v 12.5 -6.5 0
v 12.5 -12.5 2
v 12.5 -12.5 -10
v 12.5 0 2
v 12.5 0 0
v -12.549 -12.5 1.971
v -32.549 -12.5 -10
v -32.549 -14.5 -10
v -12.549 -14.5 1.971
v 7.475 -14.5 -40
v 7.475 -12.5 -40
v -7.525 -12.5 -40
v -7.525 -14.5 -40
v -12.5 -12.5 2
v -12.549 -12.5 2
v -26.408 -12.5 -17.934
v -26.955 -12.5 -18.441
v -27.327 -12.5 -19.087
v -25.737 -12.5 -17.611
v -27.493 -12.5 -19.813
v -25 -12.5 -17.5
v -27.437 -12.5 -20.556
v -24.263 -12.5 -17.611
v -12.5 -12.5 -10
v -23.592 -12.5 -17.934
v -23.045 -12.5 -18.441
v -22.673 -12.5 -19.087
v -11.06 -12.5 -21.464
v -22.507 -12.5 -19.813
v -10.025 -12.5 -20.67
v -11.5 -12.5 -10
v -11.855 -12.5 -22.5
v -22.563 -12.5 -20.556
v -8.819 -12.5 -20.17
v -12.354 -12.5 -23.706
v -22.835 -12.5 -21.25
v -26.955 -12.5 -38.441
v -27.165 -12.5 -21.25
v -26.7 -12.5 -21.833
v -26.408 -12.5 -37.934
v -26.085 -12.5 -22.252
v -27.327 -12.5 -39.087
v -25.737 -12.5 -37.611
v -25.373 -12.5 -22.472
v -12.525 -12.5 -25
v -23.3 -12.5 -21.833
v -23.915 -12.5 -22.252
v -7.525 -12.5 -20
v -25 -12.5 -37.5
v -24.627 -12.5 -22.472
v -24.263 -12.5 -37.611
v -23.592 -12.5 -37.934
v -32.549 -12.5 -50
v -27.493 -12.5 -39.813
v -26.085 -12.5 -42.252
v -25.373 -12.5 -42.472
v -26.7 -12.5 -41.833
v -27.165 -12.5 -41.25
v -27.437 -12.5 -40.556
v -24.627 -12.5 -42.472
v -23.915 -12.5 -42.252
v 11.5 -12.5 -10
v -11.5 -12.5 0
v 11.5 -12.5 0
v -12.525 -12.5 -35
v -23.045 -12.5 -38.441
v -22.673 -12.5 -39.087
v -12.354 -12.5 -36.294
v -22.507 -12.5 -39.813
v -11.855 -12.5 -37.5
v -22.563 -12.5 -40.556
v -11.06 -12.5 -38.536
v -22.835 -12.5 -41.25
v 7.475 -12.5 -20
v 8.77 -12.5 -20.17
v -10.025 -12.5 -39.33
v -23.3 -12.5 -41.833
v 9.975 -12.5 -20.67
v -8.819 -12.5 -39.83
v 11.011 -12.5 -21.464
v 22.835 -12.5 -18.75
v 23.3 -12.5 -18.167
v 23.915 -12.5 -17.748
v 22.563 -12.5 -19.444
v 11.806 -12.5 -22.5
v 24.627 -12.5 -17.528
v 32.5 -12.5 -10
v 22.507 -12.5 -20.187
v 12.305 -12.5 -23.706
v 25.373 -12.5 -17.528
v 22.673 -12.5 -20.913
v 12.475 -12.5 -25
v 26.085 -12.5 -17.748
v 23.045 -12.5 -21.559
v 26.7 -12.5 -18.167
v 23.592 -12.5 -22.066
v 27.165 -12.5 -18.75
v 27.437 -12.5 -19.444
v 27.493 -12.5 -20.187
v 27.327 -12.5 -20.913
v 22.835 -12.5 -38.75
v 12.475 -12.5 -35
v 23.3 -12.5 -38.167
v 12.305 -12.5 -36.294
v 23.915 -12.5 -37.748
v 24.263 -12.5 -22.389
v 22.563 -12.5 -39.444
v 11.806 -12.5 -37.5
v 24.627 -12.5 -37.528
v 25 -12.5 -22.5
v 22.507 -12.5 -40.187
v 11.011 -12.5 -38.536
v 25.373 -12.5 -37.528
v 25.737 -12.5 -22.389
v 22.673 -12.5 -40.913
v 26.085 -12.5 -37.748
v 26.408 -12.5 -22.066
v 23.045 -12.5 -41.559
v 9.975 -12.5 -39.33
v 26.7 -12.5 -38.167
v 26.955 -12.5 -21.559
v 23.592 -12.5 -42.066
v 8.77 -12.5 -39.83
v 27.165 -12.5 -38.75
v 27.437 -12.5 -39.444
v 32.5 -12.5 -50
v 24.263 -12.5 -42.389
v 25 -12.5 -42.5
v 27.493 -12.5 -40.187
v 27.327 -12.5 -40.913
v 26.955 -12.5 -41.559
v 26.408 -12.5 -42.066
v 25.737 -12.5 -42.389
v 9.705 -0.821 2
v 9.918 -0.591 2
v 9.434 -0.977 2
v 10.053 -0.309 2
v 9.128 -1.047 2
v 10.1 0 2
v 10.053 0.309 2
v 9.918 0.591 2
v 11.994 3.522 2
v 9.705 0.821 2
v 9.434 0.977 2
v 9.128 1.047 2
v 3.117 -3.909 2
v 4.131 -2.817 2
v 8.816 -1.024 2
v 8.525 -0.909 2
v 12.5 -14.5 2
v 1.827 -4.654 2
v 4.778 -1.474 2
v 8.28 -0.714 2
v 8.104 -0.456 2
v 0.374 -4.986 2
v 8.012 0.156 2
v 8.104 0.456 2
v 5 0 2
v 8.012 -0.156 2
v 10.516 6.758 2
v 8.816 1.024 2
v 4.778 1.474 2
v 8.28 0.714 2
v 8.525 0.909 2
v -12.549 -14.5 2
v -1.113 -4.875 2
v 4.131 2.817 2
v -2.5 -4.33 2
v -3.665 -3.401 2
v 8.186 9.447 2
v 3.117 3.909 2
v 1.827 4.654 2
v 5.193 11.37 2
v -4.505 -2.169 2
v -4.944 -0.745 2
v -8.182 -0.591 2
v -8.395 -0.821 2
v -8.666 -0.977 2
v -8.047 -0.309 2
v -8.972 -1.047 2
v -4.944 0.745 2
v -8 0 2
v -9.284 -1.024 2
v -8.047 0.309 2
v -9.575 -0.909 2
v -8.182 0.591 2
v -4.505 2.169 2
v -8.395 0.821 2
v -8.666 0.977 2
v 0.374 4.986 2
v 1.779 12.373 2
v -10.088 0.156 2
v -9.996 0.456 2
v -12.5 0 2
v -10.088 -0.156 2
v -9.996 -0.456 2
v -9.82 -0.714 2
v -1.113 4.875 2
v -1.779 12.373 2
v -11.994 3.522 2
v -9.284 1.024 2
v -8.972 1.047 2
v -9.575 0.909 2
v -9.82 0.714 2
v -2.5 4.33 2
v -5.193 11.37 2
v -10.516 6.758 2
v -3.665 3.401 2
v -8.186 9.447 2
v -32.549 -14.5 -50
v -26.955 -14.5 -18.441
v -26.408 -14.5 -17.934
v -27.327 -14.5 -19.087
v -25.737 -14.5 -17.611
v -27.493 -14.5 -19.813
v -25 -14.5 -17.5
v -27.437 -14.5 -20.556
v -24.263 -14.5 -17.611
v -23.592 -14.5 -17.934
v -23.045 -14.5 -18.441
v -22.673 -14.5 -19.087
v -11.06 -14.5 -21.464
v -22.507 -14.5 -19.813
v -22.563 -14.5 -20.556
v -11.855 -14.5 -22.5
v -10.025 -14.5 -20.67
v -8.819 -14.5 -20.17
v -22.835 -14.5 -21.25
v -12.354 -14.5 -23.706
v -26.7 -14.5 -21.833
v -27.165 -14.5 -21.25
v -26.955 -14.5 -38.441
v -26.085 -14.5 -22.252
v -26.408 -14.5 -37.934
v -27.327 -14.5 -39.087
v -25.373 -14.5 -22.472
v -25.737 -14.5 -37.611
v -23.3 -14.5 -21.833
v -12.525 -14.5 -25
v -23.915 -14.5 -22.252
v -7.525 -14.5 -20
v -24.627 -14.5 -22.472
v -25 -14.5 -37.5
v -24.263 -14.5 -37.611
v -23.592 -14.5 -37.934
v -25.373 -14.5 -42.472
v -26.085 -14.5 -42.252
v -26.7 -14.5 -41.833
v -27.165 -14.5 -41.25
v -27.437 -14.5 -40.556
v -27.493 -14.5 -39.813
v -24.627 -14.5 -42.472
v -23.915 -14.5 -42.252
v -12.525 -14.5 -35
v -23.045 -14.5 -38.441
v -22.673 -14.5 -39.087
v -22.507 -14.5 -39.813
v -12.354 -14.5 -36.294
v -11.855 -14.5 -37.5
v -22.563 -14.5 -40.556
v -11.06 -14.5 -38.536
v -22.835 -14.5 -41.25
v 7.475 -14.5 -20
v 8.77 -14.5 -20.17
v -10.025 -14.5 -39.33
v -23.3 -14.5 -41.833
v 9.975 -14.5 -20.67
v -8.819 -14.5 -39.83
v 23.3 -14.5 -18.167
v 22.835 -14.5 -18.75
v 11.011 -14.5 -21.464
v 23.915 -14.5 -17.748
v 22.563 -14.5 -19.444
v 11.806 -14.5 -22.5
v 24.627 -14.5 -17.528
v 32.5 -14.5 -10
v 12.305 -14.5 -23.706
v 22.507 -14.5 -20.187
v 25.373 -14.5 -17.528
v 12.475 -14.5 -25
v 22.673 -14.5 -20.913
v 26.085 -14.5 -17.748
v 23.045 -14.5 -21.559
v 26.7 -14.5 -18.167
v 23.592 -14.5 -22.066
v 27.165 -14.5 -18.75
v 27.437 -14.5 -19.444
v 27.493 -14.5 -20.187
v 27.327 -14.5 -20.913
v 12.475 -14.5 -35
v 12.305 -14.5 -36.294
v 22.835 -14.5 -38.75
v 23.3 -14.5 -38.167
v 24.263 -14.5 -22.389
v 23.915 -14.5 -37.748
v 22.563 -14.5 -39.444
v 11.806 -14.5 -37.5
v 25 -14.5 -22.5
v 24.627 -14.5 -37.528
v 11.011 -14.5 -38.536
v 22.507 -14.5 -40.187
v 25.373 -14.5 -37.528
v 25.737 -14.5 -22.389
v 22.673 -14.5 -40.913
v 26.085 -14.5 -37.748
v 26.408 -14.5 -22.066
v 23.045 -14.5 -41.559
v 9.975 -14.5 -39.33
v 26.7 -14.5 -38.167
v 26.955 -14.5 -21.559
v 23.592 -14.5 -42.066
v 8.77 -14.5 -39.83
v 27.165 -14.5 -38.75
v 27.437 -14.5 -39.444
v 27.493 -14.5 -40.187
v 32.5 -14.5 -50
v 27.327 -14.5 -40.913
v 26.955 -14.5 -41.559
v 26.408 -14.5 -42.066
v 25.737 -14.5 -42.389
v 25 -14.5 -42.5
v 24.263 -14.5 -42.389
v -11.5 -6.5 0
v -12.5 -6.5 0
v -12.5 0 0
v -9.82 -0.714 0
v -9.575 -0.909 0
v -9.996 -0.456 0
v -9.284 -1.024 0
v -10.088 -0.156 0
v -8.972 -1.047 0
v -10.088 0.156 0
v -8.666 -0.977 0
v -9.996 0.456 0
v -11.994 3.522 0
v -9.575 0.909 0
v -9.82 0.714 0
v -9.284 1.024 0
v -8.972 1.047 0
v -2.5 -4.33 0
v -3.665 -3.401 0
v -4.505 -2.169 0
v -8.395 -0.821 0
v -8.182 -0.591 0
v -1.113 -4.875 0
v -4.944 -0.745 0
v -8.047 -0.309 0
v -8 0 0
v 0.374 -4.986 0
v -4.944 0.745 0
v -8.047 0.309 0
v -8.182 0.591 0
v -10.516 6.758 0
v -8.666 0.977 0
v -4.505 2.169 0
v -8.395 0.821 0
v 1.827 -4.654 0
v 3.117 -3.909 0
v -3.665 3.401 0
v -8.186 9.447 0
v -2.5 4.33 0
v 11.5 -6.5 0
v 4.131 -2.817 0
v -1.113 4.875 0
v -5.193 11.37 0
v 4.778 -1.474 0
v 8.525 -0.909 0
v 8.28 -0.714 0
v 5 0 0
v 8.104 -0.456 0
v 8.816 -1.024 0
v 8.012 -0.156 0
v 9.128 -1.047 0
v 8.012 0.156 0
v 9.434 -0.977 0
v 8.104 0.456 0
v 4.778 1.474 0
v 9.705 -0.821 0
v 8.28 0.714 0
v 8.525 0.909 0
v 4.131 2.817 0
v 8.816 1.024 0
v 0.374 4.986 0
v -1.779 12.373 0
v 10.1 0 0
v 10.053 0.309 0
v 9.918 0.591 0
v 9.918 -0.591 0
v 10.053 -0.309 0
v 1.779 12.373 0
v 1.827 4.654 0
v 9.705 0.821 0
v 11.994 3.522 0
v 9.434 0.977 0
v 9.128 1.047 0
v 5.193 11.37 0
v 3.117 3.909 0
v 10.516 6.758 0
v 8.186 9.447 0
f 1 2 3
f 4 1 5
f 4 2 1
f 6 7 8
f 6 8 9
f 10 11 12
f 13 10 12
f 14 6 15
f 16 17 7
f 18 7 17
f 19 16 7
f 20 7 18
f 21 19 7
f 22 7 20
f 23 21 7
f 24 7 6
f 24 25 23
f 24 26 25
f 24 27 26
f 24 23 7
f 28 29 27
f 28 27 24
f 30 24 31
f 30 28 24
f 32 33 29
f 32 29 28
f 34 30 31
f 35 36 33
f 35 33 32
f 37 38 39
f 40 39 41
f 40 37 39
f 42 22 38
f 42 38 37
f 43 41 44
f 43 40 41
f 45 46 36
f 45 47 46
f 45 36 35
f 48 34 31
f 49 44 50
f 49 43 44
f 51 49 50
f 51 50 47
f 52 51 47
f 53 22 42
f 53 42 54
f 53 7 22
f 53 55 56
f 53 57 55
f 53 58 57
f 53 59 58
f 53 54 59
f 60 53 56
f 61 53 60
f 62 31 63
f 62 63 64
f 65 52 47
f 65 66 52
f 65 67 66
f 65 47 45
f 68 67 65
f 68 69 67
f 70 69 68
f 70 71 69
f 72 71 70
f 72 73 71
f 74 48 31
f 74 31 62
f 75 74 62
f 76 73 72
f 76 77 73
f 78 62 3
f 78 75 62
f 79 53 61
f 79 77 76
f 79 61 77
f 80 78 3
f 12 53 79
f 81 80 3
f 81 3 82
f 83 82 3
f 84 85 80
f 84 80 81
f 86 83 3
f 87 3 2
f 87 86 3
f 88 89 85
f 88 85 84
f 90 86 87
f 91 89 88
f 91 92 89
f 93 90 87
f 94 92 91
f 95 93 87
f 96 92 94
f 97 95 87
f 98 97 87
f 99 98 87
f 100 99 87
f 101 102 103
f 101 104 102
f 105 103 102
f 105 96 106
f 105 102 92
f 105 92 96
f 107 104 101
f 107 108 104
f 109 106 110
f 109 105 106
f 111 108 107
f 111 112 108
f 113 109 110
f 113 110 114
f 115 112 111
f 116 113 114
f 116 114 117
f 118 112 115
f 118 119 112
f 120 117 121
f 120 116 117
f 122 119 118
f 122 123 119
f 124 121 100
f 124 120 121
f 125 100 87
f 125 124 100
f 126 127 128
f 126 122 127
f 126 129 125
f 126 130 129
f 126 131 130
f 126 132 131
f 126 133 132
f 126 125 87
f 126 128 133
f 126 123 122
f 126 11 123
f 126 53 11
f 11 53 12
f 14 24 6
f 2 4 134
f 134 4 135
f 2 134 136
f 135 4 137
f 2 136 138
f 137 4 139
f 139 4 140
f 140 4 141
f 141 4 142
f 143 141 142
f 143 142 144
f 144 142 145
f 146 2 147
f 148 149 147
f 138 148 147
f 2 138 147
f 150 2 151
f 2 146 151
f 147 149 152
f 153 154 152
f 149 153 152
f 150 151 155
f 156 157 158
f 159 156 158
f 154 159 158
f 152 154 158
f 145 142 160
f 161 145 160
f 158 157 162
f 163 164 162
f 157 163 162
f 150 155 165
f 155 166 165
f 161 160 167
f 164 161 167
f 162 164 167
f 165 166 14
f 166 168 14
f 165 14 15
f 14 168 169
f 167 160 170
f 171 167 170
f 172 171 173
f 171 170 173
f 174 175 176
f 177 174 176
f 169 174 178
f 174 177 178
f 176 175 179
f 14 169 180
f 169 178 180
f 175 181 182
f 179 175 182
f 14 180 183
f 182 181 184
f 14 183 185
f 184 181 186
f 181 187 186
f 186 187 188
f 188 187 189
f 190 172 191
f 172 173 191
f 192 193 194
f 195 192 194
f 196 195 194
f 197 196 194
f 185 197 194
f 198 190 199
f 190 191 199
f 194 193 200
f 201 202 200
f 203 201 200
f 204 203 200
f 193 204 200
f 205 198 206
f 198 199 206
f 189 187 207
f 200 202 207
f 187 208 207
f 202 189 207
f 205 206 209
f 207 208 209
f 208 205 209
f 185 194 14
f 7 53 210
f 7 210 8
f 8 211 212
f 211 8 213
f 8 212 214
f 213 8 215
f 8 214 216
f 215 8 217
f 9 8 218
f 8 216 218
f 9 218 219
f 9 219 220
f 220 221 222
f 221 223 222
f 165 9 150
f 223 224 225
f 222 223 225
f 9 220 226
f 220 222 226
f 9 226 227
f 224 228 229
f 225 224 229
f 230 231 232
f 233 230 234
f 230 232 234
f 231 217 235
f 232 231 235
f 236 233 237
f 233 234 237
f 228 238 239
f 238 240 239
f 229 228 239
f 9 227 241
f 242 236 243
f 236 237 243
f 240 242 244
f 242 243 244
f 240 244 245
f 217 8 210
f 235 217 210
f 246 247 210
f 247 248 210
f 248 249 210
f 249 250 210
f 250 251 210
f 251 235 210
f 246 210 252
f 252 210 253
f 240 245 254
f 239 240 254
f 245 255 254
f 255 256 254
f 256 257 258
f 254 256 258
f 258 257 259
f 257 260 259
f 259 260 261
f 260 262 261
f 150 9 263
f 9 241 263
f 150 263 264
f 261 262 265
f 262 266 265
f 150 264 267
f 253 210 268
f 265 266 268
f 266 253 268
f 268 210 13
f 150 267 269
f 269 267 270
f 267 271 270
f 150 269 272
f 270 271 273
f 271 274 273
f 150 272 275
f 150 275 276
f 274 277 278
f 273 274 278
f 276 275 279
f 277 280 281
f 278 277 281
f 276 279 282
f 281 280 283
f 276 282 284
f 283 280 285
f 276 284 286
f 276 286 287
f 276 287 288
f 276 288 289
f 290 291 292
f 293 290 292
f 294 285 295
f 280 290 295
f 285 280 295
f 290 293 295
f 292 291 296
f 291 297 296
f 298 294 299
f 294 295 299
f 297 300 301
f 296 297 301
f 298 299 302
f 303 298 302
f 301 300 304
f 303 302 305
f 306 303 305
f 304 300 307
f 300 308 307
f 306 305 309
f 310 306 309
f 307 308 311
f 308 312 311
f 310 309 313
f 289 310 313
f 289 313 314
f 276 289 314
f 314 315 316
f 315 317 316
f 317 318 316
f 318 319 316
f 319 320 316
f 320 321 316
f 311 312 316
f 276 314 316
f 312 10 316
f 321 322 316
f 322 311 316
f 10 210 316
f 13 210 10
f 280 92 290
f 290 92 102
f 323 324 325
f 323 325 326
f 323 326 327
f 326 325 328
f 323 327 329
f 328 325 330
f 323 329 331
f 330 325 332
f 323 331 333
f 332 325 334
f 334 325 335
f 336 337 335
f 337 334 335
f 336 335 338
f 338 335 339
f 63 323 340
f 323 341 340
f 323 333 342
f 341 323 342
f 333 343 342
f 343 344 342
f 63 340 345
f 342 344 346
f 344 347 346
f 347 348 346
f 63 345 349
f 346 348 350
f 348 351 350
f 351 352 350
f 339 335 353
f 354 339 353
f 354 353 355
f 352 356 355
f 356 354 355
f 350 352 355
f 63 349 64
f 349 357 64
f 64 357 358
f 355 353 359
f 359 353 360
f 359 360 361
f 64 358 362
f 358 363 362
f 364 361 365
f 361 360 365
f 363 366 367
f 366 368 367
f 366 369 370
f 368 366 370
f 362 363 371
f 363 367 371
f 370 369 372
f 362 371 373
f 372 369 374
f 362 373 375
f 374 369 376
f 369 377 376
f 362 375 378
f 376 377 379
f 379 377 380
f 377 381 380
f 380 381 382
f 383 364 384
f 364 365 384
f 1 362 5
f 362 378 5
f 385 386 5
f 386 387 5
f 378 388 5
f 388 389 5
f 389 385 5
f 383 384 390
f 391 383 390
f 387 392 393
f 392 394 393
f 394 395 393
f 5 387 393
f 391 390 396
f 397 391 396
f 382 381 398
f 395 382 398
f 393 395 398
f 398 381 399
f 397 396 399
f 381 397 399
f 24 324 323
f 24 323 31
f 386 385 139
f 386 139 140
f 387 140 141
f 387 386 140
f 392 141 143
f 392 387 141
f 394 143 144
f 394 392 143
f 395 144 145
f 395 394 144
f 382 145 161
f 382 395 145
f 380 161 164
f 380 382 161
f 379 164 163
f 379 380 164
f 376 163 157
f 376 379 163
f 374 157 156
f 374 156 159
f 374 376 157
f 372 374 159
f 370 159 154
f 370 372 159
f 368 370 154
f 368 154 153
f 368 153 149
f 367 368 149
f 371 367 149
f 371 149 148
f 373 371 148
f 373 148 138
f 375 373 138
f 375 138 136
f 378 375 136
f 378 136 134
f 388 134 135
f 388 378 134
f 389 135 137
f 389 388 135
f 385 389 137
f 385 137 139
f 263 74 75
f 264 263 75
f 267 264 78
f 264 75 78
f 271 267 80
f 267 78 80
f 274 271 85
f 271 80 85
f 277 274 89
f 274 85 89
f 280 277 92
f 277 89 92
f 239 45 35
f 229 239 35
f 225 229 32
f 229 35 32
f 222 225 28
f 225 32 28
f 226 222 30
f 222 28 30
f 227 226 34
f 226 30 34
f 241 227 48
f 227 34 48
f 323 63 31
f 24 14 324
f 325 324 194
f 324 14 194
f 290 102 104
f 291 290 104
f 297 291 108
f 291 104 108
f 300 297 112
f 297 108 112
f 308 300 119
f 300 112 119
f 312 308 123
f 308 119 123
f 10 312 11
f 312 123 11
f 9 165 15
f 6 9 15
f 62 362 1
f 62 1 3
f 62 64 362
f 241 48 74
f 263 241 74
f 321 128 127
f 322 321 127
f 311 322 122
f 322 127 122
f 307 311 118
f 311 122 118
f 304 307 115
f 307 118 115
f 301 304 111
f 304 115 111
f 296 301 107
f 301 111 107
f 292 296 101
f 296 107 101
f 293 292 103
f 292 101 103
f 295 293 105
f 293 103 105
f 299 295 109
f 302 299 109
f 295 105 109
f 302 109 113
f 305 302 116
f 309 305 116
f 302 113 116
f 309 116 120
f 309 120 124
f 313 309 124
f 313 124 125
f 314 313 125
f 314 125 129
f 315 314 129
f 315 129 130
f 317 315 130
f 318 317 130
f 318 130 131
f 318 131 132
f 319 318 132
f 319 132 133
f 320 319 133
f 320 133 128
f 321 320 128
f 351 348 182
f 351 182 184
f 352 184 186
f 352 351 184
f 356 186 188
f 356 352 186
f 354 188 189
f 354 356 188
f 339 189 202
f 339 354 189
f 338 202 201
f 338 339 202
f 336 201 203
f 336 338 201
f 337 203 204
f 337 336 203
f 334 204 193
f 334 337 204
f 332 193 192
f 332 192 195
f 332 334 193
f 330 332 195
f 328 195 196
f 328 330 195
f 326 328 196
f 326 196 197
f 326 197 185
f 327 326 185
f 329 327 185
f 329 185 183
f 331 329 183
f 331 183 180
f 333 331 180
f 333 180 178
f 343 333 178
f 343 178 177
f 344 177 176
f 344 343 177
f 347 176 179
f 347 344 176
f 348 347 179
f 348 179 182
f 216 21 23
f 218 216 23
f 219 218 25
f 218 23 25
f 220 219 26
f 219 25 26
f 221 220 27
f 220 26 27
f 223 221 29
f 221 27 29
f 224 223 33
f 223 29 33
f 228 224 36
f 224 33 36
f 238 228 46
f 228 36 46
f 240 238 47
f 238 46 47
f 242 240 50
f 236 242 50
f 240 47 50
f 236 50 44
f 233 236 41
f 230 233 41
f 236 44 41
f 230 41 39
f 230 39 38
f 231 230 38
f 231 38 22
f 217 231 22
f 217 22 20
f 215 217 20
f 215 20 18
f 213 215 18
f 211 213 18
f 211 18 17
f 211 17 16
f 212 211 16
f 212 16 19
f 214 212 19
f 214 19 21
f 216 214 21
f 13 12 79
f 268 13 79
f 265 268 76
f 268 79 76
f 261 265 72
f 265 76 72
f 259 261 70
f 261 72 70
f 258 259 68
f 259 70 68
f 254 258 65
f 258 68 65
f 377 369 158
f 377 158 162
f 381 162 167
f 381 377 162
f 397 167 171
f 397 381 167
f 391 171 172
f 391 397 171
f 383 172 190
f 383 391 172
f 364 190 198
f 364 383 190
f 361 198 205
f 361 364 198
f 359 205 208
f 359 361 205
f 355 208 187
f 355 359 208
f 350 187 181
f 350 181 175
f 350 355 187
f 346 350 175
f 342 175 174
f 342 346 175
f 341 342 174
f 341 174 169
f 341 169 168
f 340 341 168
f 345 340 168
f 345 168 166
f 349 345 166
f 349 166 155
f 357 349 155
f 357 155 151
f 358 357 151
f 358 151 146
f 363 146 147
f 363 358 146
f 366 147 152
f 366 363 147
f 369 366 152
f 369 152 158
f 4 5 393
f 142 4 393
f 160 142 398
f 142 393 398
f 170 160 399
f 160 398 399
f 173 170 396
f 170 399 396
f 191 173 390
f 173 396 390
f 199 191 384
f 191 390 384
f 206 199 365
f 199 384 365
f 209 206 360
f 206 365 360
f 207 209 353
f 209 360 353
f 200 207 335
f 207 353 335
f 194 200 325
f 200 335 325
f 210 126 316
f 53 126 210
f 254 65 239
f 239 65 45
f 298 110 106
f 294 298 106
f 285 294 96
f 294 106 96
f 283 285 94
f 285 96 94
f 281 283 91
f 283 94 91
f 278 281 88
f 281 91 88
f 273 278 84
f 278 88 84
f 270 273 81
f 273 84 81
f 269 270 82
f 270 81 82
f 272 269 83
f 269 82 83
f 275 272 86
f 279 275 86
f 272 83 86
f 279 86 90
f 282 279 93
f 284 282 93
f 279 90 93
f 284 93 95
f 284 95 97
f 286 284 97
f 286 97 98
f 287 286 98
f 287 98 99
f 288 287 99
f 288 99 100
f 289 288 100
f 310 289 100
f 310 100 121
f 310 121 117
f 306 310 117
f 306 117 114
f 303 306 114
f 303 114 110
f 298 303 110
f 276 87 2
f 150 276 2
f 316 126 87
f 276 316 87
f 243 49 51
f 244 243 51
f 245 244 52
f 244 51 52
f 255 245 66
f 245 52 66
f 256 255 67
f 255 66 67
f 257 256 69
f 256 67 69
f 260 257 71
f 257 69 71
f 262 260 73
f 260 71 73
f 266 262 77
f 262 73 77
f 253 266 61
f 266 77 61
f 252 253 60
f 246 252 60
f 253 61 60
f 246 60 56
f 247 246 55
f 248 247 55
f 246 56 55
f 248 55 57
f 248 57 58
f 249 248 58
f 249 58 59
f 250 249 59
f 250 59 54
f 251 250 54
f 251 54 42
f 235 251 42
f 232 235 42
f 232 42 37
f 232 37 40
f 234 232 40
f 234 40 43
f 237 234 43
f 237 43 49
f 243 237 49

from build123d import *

# Parameters (mm, degrees)
SKETCH1_R                = 12.5
SKETCH1_R_2              = 1.05
SKETCH1_R_3              = 5
BOSS_EXTRUDE1_DEPTH      = 2
BOSS_EXTRUDE5_START      = -2
BOSS_EXTRUDE5_DEPTH      = 2
BOSS_EXTRUDE6_DEPTH      = 50
BOSS_EXTRUDE6_DEPTH_BACK = 2
SKETCH9_W                = 25.04914064
SKETCH9_H                = 2
BOSS_EXTRUDE7_DEPTH      = 2
SKETCH13_R               = 2.5
CUT_EXTRUDE1_DEPTH       = 7
SKETCH15_W               = 1
SKETCH15_H               = 6
BOSS_EXTRUDE8_DEPTH      = 10
CUT_EXTRUDE2_START       = -1
CUT_EXTRUDE2_DEPTH       = 25
CUT_EXTRUDE3_DEPTH       = 5


# Read off the part's stored shape, not the designer's step: Cut-Extrude2
with BuildPart() as part:
    # Sketch1 → Boss-Extrude1 (new body)
    with BuildSketch(Plane.XY):
        Circle(SKETCH1_R)
        with Locations((-9.05, 0)):
            Circle(SKETCH1_R_2, mode=Mode.SUBTRACT)
        with Locations((9.05, 0)):
            Circle(SKETCH1_R_2, mode=Mode.SUBTRACT)
        Circle(SKETCH1_R_3, mode=Mode.SUBTRACT)
    extrude(amount=BOSS_EXTRUDE1_DEPTH)

    # Sketch2 → Boss-Extrude5 (add)
    with BuildSketch(Plane.XY.offset(2).offset(BOSS_EXTRUDE5_START)):
        with BuildLine():
            ThreePointArc((12.5, 0), (8.838834759, -8.838834771), (-1.6e-08, -12.5))
            Line((-1.6e-08, -12.5), (12.5, -12.5))
            Line((12.5, -12.5), (12.5, 0))
        make_face()
        with BuildLine():
            ThreePointArc((-1.6e-08, -12.5), (-8.838834771, -8.838834759), (-12.5, 0))
            Line((-12.5, 0), (-12.5, -12.5))
            Line((-12.5, -12.5), (-1.6e-08, -12.5))
        make_face()
    extrude(amount=BOSS_EXTRUDE5_DEPTH)

    # Sketch9 → Boss-Extrude6 (add, two sides: drawn at the far end of the back side and taken through both)
    with BuildSketch(Plane(origin=(0, 0, 0), x_dir=(-1, 0, 0), z_dir=(0, 0, -1)).offset(-BOSS_EXTRUDE6_DEPTH_BACK)):
        with Locations((0.02457032, -13.5)):
            Rectangle(SKETCH9_W, SKETCH9_H)
    extrude(amount=BOSS_EXTRUDE6_DEPTH + BOSS_EXTRUDE6_DEPTH_BACK)

    # Sketch12 → Boss-Extrude7 (add)
    with BuildSketch(Plane(origin=(0, -12.5, 0), x_dir=(1, 0, 0), z_dir=(0, 1, 0))):
        Polygon((-12.54914064, 50), (-32.54914064, 50), (-32.54914064, 10), (-12.5, -2), (-12.54914064, 0), align=None)
        Polygon((12.5, 50), (32.5, 50), (32.5, 10), (12.5, -2), (12.5, 0), align=None)
    extrude(amount=-BOSS_EXTRUDE7_DEPTH)

    # Sketch13 → Cut-Extrude1 (cut)
    with BuildSketch(Plane(origin=(0, -12.5, 0), x_dir=(1, 0, 0), z_dir=(0, 1, 0))):
        with Locations(Location((-25, 20, 0), (0, 0, 270))):
            Circle(SKETCH13_R)
        with Locations(Location((-25, 40, 0), (0, 0, 270))):
            Circle(SKETCH13_R)
        with Locations(Location((25, 40, 0), (0, 0, 90))):
            Circle(SKETCH13_R)
        with Locations(Location((25, 20, 0), (0, 0, 90))):
            Circle(SKETCH13_R)
    extrude(amount=-CUT_EXTRUDE1_DEPTH, mode=Mode.SUBTRACT)

    # Sketch15 → Boss-Extrude8 (add)
    with BuildSketch(Plane(origin=(0, 0, 0), x_dir=(-1, 0, 0), z_dir=(0, 0, -1))):
        with Locations((12, -9.5)):
            Rectangle(SKETCH15_W, SKETCH15_H)
        with Locations((-12, -9.5)):
            Rectangle(SKETCH15_W, SKETCH15_H)
    extrude(amount=BOSS_EXTRUDE8_DEPTH)

    # Cut-Extrude2 outline → Cut-Extrude2 (cut)
    with BuildSketch(Plane(origin=(-11.5, 0, 0), x_dir=(0, 0, -1), z_dir=(1, 0, 0)).offset(CUT_EXTRUDE2_START)):
        Polygon((10, -6.5), (0, -6.5), (10, -12.5), align=None)
    extrude(amount=CUT_EXTRUDE2_DEPTH, mode=Mode.SUBTRACT)

    # Sketch17 → Cut-Extrude3 (cut)
    with BuildSketch(Plane(origin=(0, -12.5, 0), x_dir=(1, 0, 0), z_dir=(0, 1, 0))):
        with BuildLine():
            Line((7.47542968, 40), (-7.52457032, 40))
            ThreePointArc((-7.52457032, 40), (-11.060104226, 38.535533906), (-12.52457032, 35))
            Line((-12.52457032, 35), (-12.52457032, 25))
            ThreePointArc((-12.52457032, 25), (-11.060104226, 21.464466094), (-7.52457032, 20))
            Line((-7.52457032, 20), (7.47542968, 20))
            ThreePointArc((7.47542968, 20), (11.010963586, 21.464466094), (12.47542968, 25))
            Line((12.47542968, 25), (12.47542968, 35))
            ThreePointArc((12.47542968, 35), (11.010963586, 38.535533906), (7.47542968, 40))
        make_face()
    extrude(amount=-CUT_EXTRUDE3_DEPTH, mode=Mode.SUBTRACT)


solid = part.part
